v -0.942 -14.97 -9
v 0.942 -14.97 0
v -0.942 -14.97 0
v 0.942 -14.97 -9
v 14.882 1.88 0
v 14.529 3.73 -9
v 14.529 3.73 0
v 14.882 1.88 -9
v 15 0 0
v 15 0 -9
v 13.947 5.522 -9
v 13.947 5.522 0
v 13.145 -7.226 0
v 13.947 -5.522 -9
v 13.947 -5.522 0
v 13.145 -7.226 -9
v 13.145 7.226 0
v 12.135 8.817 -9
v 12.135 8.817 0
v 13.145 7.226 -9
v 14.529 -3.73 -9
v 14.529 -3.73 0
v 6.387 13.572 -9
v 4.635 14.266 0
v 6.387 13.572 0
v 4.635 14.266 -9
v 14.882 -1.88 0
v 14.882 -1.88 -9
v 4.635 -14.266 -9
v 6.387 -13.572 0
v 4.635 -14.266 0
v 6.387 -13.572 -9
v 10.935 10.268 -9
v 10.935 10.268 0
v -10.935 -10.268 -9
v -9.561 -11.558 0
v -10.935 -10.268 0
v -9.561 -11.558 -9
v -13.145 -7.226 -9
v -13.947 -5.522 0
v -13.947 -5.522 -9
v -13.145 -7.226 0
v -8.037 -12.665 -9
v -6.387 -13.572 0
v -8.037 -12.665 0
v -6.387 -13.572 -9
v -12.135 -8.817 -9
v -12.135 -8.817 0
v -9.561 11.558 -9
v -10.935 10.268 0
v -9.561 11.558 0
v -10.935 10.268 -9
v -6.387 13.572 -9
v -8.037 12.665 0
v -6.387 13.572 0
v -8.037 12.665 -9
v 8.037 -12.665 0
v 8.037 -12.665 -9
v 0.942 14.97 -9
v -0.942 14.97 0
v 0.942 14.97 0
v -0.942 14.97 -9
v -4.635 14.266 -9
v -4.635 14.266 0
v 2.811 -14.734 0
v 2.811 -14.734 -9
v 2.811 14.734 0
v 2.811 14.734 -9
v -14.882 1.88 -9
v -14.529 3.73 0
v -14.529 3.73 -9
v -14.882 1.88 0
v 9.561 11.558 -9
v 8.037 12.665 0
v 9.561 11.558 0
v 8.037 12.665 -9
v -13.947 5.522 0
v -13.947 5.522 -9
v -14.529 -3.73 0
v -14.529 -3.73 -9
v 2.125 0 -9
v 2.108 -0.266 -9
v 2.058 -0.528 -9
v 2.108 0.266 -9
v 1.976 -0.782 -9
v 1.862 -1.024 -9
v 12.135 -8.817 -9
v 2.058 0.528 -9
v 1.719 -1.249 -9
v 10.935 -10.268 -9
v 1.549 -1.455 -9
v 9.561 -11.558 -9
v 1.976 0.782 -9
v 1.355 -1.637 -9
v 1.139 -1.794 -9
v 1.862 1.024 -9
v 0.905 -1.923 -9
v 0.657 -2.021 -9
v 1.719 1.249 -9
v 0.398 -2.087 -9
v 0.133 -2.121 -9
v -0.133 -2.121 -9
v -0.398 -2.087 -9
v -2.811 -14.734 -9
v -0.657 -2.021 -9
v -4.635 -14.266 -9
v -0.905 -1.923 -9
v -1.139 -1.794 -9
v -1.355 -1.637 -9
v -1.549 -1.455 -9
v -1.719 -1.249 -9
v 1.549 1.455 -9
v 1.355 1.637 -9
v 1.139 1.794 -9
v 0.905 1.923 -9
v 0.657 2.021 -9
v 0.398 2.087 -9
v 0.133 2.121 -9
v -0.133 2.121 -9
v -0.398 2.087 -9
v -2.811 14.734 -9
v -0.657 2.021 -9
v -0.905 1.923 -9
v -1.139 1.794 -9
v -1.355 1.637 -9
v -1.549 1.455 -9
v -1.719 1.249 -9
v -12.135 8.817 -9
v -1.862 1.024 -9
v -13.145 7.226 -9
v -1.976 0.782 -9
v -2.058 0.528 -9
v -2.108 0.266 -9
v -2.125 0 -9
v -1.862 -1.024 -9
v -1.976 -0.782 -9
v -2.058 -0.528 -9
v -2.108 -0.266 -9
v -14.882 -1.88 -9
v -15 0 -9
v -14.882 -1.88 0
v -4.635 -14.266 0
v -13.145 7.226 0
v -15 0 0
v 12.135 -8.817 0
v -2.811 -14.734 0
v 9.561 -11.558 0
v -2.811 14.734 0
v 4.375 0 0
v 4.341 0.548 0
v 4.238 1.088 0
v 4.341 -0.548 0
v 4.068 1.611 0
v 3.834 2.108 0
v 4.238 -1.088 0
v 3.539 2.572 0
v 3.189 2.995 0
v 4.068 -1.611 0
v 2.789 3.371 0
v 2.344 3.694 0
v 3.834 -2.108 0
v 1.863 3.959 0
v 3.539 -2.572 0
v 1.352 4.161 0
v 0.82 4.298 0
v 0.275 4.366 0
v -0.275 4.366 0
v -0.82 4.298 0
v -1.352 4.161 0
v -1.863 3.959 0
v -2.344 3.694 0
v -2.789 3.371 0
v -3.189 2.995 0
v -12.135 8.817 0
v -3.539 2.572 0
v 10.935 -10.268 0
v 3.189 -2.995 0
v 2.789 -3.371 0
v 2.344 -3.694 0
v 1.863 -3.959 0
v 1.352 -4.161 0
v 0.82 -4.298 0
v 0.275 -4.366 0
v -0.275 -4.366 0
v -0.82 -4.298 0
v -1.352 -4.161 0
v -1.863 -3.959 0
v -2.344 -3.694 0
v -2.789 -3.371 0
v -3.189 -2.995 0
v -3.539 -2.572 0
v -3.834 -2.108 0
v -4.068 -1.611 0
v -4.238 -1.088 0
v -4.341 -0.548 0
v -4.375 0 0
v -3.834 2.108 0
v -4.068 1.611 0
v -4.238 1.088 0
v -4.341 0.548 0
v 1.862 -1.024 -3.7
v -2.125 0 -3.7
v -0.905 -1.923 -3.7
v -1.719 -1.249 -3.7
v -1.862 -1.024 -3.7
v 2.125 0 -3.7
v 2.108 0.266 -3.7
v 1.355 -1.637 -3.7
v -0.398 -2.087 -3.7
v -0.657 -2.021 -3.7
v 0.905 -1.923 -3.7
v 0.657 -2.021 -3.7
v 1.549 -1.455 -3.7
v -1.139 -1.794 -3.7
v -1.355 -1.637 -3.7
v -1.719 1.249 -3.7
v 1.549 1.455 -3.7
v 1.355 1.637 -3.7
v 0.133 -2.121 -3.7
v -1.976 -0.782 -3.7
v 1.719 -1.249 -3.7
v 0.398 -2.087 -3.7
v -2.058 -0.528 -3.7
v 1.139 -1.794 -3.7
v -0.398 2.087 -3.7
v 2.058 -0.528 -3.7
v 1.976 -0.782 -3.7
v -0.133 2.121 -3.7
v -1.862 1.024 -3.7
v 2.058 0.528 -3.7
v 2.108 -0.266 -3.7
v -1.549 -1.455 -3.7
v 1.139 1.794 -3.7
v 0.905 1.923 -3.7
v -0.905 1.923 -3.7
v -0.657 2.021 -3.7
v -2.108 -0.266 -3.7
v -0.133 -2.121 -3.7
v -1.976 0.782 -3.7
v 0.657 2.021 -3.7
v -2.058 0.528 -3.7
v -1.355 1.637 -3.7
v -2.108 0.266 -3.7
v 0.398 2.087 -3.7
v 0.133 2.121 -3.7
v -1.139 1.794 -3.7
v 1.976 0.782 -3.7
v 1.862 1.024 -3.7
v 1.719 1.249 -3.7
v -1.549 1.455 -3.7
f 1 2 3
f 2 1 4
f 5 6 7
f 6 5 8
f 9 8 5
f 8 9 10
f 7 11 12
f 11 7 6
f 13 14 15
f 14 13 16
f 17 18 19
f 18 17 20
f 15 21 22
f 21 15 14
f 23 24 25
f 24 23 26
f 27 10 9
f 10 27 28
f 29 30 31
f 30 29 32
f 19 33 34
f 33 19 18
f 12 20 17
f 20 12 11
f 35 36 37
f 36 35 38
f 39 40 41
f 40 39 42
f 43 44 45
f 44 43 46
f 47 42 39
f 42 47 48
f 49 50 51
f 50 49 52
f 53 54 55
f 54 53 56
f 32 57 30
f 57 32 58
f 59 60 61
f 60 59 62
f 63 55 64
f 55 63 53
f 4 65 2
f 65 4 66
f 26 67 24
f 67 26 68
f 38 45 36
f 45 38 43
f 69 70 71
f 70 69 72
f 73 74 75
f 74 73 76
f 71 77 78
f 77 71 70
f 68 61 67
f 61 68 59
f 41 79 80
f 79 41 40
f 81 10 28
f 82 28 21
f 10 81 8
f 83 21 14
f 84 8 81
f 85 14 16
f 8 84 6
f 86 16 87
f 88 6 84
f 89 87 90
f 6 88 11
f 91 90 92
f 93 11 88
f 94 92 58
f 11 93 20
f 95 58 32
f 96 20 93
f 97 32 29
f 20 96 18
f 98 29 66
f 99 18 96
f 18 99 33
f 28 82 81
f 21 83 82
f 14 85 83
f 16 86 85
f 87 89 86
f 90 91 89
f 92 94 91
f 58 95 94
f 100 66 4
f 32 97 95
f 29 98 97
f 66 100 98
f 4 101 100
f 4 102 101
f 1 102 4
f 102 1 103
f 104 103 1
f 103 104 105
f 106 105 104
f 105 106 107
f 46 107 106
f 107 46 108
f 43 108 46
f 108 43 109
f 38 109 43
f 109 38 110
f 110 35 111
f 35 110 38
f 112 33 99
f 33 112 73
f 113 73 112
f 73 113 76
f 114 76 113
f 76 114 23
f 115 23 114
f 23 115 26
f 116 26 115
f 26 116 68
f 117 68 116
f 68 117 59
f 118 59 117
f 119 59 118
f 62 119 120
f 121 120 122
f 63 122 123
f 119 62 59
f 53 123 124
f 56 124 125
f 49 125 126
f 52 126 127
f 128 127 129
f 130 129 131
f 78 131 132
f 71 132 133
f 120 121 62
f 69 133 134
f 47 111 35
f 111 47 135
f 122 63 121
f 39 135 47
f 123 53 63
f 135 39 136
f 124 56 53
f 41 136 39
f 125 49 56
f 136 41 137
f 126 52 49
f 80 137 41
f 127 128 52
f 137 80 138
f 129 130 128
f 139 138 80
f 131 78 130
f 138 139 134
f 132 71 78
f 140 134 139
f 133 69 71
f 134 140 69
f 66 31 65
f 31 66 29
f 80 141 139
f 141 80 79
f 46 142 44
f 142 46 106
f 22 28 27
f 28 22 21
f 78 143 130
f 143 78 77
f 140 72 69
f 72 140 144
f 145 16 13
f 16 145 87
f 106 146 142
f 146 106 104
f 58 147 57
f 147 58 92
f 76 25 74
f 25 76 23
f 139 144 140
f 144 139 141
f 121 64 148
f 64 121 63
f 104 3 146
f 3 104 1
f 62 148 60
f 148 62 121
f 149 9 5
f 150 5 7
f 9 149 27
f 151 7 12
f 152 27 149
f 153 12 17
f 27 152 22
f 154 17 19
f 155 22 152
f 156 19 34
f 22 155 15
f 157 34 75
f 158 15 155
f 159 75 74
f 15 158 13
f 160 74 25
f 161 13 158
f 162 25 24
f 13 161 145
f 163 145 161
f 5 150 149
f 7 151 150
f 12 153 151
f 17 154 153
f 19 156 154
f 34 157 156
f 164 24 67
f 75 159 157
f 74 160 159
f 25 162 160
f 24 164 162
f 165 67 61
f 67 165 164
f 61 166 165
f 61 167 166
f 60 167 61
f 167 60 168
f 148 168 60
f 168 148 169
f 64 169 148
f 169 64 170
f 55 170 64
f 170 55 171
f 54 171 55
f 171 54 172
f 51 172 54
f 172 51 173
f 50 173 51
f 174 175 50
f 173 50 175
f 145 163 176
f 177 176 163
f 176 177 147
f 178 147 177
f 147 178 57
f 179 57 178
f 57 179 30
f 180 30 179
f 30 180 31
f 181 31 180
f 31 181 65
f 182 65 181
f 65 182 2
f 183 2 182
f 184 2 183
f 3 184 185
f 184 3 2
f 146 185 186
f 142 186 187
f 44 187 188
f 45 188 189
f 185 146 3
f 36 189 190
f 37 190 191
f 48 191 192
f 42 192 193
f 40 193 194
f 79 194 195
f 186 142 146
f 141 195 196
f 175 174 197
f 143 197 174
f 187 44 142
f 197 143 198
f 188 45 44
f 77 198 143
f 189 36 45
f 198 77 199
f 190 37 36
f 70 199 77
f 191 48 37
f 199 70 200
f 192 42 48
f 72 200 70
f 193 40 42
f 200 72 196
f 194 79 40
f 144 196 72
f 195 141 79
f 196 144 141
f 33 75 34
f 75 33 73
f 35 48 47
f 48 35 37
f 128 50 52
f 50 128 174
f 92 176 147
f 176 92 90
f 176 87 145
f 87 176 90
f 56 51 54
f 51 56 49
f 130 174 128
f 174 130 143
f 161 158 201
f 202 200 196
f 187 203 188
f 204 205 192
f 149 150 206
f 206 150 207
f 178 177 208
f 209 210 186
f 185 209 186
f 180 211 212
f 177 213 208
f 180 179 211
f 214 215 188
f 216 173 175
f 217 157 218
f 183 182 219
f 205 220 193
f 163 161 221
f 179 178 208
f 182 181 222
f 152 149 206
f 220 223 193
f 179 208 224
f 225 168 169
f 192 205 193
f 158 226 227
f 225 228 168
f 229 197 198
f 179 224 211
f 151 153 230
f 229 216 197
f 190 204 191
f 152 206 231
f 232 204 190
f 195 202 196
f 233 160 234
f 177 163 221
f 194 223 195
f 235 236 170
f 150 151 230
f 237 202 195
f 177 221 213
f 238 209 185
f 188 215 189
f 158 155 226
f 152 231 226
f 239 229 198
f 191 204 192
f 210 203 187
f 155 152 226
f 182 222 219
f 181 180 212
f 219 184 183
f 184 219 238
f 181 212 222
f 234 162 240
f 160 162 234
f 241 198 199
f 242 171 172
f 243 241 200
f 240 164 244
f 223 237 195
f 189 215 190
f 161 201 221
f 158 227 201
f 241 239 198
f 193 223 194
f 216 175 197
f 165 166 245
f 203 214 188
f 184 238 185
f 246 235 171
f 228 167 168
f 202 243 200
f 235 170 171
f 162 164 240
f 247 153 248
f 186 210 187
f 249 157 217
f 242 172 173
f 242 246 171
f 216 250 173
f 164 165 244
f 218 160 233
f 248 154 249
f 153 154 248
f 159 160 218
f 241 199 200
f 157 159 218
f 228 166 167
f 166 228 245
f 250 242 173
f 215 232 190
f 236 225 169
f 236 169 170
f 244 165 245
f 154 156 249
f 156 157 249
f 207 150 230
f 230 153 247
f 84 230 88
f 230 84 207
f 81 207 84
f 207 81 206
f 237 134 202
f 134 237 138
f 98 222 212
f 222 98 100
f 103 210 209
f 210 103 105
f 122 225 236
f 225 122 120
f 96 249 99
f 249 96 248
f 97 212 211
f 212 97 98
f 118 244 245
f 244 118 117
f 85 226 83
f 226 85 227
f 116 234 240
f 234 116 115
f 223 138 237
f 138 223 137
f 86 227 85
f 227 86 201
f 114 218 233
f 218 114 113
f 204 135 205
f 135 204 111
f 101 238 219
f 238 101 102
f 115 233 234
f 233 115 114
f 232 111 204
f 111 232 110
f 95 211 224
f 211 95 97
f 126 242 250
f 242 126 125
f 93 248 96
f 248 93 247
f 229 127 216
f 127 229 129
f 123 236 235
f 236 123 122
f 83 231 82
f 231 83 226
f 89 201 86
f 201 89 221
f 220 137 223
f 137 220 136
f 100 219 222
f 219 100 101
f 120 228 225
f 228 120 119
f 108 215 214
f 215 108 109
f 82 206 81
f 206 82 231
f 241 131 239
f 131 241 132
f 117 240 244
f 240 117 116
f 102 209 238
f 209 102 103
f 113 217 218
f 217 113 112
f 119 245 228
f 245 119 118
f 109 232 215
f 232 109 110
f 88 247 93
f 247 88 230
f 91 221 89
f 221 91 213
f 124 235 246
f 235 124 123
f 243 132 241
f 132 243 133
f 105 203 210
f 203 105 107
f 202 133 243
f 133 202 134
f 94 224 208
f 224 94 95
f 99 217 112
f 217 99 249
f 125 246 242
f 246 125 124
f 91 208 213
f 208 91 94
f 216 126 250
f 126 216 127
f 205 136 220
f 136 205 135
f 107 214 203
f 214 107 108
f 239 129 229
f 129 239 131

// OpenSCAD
$fn = 50;


difference() {
	union() {
		translate(v = [0, 0, -9.0000000000]) {
			cylinder(h = 9, r = 15.0000000000);
		}
		translate(v = [0, 0, -9.0000000000]) {
			cylinder(h = 9, r = 2.8750000000);
		}
	}
	union() {
		translate(v = [0, 0, 0]) {
			rotate(a = [0, 0, 0]) {
				difference() {
					union() {
						#translate(v = [0, 0, -9.0000000000]) {
							cylinder(h = 9, r = 2.0000000000);
						}
						#translate(v = [0, 0, -3.7000000000]) {
							cylinder(h = 3.7000000000, r1 = 2.1250000000, r2 = 4.3750000000);
						}
						#translate(v = [0, 0, -9.0000000000]) {
							cylinder(h = 9, r = 2.1250000000);
						}
						#translate(v = [0, 0, -9.0000000000]) {
							cylinder(h = 9, r = 2.0000000000);
						}
					}
					union();
				}
			}
		}
	}
}
